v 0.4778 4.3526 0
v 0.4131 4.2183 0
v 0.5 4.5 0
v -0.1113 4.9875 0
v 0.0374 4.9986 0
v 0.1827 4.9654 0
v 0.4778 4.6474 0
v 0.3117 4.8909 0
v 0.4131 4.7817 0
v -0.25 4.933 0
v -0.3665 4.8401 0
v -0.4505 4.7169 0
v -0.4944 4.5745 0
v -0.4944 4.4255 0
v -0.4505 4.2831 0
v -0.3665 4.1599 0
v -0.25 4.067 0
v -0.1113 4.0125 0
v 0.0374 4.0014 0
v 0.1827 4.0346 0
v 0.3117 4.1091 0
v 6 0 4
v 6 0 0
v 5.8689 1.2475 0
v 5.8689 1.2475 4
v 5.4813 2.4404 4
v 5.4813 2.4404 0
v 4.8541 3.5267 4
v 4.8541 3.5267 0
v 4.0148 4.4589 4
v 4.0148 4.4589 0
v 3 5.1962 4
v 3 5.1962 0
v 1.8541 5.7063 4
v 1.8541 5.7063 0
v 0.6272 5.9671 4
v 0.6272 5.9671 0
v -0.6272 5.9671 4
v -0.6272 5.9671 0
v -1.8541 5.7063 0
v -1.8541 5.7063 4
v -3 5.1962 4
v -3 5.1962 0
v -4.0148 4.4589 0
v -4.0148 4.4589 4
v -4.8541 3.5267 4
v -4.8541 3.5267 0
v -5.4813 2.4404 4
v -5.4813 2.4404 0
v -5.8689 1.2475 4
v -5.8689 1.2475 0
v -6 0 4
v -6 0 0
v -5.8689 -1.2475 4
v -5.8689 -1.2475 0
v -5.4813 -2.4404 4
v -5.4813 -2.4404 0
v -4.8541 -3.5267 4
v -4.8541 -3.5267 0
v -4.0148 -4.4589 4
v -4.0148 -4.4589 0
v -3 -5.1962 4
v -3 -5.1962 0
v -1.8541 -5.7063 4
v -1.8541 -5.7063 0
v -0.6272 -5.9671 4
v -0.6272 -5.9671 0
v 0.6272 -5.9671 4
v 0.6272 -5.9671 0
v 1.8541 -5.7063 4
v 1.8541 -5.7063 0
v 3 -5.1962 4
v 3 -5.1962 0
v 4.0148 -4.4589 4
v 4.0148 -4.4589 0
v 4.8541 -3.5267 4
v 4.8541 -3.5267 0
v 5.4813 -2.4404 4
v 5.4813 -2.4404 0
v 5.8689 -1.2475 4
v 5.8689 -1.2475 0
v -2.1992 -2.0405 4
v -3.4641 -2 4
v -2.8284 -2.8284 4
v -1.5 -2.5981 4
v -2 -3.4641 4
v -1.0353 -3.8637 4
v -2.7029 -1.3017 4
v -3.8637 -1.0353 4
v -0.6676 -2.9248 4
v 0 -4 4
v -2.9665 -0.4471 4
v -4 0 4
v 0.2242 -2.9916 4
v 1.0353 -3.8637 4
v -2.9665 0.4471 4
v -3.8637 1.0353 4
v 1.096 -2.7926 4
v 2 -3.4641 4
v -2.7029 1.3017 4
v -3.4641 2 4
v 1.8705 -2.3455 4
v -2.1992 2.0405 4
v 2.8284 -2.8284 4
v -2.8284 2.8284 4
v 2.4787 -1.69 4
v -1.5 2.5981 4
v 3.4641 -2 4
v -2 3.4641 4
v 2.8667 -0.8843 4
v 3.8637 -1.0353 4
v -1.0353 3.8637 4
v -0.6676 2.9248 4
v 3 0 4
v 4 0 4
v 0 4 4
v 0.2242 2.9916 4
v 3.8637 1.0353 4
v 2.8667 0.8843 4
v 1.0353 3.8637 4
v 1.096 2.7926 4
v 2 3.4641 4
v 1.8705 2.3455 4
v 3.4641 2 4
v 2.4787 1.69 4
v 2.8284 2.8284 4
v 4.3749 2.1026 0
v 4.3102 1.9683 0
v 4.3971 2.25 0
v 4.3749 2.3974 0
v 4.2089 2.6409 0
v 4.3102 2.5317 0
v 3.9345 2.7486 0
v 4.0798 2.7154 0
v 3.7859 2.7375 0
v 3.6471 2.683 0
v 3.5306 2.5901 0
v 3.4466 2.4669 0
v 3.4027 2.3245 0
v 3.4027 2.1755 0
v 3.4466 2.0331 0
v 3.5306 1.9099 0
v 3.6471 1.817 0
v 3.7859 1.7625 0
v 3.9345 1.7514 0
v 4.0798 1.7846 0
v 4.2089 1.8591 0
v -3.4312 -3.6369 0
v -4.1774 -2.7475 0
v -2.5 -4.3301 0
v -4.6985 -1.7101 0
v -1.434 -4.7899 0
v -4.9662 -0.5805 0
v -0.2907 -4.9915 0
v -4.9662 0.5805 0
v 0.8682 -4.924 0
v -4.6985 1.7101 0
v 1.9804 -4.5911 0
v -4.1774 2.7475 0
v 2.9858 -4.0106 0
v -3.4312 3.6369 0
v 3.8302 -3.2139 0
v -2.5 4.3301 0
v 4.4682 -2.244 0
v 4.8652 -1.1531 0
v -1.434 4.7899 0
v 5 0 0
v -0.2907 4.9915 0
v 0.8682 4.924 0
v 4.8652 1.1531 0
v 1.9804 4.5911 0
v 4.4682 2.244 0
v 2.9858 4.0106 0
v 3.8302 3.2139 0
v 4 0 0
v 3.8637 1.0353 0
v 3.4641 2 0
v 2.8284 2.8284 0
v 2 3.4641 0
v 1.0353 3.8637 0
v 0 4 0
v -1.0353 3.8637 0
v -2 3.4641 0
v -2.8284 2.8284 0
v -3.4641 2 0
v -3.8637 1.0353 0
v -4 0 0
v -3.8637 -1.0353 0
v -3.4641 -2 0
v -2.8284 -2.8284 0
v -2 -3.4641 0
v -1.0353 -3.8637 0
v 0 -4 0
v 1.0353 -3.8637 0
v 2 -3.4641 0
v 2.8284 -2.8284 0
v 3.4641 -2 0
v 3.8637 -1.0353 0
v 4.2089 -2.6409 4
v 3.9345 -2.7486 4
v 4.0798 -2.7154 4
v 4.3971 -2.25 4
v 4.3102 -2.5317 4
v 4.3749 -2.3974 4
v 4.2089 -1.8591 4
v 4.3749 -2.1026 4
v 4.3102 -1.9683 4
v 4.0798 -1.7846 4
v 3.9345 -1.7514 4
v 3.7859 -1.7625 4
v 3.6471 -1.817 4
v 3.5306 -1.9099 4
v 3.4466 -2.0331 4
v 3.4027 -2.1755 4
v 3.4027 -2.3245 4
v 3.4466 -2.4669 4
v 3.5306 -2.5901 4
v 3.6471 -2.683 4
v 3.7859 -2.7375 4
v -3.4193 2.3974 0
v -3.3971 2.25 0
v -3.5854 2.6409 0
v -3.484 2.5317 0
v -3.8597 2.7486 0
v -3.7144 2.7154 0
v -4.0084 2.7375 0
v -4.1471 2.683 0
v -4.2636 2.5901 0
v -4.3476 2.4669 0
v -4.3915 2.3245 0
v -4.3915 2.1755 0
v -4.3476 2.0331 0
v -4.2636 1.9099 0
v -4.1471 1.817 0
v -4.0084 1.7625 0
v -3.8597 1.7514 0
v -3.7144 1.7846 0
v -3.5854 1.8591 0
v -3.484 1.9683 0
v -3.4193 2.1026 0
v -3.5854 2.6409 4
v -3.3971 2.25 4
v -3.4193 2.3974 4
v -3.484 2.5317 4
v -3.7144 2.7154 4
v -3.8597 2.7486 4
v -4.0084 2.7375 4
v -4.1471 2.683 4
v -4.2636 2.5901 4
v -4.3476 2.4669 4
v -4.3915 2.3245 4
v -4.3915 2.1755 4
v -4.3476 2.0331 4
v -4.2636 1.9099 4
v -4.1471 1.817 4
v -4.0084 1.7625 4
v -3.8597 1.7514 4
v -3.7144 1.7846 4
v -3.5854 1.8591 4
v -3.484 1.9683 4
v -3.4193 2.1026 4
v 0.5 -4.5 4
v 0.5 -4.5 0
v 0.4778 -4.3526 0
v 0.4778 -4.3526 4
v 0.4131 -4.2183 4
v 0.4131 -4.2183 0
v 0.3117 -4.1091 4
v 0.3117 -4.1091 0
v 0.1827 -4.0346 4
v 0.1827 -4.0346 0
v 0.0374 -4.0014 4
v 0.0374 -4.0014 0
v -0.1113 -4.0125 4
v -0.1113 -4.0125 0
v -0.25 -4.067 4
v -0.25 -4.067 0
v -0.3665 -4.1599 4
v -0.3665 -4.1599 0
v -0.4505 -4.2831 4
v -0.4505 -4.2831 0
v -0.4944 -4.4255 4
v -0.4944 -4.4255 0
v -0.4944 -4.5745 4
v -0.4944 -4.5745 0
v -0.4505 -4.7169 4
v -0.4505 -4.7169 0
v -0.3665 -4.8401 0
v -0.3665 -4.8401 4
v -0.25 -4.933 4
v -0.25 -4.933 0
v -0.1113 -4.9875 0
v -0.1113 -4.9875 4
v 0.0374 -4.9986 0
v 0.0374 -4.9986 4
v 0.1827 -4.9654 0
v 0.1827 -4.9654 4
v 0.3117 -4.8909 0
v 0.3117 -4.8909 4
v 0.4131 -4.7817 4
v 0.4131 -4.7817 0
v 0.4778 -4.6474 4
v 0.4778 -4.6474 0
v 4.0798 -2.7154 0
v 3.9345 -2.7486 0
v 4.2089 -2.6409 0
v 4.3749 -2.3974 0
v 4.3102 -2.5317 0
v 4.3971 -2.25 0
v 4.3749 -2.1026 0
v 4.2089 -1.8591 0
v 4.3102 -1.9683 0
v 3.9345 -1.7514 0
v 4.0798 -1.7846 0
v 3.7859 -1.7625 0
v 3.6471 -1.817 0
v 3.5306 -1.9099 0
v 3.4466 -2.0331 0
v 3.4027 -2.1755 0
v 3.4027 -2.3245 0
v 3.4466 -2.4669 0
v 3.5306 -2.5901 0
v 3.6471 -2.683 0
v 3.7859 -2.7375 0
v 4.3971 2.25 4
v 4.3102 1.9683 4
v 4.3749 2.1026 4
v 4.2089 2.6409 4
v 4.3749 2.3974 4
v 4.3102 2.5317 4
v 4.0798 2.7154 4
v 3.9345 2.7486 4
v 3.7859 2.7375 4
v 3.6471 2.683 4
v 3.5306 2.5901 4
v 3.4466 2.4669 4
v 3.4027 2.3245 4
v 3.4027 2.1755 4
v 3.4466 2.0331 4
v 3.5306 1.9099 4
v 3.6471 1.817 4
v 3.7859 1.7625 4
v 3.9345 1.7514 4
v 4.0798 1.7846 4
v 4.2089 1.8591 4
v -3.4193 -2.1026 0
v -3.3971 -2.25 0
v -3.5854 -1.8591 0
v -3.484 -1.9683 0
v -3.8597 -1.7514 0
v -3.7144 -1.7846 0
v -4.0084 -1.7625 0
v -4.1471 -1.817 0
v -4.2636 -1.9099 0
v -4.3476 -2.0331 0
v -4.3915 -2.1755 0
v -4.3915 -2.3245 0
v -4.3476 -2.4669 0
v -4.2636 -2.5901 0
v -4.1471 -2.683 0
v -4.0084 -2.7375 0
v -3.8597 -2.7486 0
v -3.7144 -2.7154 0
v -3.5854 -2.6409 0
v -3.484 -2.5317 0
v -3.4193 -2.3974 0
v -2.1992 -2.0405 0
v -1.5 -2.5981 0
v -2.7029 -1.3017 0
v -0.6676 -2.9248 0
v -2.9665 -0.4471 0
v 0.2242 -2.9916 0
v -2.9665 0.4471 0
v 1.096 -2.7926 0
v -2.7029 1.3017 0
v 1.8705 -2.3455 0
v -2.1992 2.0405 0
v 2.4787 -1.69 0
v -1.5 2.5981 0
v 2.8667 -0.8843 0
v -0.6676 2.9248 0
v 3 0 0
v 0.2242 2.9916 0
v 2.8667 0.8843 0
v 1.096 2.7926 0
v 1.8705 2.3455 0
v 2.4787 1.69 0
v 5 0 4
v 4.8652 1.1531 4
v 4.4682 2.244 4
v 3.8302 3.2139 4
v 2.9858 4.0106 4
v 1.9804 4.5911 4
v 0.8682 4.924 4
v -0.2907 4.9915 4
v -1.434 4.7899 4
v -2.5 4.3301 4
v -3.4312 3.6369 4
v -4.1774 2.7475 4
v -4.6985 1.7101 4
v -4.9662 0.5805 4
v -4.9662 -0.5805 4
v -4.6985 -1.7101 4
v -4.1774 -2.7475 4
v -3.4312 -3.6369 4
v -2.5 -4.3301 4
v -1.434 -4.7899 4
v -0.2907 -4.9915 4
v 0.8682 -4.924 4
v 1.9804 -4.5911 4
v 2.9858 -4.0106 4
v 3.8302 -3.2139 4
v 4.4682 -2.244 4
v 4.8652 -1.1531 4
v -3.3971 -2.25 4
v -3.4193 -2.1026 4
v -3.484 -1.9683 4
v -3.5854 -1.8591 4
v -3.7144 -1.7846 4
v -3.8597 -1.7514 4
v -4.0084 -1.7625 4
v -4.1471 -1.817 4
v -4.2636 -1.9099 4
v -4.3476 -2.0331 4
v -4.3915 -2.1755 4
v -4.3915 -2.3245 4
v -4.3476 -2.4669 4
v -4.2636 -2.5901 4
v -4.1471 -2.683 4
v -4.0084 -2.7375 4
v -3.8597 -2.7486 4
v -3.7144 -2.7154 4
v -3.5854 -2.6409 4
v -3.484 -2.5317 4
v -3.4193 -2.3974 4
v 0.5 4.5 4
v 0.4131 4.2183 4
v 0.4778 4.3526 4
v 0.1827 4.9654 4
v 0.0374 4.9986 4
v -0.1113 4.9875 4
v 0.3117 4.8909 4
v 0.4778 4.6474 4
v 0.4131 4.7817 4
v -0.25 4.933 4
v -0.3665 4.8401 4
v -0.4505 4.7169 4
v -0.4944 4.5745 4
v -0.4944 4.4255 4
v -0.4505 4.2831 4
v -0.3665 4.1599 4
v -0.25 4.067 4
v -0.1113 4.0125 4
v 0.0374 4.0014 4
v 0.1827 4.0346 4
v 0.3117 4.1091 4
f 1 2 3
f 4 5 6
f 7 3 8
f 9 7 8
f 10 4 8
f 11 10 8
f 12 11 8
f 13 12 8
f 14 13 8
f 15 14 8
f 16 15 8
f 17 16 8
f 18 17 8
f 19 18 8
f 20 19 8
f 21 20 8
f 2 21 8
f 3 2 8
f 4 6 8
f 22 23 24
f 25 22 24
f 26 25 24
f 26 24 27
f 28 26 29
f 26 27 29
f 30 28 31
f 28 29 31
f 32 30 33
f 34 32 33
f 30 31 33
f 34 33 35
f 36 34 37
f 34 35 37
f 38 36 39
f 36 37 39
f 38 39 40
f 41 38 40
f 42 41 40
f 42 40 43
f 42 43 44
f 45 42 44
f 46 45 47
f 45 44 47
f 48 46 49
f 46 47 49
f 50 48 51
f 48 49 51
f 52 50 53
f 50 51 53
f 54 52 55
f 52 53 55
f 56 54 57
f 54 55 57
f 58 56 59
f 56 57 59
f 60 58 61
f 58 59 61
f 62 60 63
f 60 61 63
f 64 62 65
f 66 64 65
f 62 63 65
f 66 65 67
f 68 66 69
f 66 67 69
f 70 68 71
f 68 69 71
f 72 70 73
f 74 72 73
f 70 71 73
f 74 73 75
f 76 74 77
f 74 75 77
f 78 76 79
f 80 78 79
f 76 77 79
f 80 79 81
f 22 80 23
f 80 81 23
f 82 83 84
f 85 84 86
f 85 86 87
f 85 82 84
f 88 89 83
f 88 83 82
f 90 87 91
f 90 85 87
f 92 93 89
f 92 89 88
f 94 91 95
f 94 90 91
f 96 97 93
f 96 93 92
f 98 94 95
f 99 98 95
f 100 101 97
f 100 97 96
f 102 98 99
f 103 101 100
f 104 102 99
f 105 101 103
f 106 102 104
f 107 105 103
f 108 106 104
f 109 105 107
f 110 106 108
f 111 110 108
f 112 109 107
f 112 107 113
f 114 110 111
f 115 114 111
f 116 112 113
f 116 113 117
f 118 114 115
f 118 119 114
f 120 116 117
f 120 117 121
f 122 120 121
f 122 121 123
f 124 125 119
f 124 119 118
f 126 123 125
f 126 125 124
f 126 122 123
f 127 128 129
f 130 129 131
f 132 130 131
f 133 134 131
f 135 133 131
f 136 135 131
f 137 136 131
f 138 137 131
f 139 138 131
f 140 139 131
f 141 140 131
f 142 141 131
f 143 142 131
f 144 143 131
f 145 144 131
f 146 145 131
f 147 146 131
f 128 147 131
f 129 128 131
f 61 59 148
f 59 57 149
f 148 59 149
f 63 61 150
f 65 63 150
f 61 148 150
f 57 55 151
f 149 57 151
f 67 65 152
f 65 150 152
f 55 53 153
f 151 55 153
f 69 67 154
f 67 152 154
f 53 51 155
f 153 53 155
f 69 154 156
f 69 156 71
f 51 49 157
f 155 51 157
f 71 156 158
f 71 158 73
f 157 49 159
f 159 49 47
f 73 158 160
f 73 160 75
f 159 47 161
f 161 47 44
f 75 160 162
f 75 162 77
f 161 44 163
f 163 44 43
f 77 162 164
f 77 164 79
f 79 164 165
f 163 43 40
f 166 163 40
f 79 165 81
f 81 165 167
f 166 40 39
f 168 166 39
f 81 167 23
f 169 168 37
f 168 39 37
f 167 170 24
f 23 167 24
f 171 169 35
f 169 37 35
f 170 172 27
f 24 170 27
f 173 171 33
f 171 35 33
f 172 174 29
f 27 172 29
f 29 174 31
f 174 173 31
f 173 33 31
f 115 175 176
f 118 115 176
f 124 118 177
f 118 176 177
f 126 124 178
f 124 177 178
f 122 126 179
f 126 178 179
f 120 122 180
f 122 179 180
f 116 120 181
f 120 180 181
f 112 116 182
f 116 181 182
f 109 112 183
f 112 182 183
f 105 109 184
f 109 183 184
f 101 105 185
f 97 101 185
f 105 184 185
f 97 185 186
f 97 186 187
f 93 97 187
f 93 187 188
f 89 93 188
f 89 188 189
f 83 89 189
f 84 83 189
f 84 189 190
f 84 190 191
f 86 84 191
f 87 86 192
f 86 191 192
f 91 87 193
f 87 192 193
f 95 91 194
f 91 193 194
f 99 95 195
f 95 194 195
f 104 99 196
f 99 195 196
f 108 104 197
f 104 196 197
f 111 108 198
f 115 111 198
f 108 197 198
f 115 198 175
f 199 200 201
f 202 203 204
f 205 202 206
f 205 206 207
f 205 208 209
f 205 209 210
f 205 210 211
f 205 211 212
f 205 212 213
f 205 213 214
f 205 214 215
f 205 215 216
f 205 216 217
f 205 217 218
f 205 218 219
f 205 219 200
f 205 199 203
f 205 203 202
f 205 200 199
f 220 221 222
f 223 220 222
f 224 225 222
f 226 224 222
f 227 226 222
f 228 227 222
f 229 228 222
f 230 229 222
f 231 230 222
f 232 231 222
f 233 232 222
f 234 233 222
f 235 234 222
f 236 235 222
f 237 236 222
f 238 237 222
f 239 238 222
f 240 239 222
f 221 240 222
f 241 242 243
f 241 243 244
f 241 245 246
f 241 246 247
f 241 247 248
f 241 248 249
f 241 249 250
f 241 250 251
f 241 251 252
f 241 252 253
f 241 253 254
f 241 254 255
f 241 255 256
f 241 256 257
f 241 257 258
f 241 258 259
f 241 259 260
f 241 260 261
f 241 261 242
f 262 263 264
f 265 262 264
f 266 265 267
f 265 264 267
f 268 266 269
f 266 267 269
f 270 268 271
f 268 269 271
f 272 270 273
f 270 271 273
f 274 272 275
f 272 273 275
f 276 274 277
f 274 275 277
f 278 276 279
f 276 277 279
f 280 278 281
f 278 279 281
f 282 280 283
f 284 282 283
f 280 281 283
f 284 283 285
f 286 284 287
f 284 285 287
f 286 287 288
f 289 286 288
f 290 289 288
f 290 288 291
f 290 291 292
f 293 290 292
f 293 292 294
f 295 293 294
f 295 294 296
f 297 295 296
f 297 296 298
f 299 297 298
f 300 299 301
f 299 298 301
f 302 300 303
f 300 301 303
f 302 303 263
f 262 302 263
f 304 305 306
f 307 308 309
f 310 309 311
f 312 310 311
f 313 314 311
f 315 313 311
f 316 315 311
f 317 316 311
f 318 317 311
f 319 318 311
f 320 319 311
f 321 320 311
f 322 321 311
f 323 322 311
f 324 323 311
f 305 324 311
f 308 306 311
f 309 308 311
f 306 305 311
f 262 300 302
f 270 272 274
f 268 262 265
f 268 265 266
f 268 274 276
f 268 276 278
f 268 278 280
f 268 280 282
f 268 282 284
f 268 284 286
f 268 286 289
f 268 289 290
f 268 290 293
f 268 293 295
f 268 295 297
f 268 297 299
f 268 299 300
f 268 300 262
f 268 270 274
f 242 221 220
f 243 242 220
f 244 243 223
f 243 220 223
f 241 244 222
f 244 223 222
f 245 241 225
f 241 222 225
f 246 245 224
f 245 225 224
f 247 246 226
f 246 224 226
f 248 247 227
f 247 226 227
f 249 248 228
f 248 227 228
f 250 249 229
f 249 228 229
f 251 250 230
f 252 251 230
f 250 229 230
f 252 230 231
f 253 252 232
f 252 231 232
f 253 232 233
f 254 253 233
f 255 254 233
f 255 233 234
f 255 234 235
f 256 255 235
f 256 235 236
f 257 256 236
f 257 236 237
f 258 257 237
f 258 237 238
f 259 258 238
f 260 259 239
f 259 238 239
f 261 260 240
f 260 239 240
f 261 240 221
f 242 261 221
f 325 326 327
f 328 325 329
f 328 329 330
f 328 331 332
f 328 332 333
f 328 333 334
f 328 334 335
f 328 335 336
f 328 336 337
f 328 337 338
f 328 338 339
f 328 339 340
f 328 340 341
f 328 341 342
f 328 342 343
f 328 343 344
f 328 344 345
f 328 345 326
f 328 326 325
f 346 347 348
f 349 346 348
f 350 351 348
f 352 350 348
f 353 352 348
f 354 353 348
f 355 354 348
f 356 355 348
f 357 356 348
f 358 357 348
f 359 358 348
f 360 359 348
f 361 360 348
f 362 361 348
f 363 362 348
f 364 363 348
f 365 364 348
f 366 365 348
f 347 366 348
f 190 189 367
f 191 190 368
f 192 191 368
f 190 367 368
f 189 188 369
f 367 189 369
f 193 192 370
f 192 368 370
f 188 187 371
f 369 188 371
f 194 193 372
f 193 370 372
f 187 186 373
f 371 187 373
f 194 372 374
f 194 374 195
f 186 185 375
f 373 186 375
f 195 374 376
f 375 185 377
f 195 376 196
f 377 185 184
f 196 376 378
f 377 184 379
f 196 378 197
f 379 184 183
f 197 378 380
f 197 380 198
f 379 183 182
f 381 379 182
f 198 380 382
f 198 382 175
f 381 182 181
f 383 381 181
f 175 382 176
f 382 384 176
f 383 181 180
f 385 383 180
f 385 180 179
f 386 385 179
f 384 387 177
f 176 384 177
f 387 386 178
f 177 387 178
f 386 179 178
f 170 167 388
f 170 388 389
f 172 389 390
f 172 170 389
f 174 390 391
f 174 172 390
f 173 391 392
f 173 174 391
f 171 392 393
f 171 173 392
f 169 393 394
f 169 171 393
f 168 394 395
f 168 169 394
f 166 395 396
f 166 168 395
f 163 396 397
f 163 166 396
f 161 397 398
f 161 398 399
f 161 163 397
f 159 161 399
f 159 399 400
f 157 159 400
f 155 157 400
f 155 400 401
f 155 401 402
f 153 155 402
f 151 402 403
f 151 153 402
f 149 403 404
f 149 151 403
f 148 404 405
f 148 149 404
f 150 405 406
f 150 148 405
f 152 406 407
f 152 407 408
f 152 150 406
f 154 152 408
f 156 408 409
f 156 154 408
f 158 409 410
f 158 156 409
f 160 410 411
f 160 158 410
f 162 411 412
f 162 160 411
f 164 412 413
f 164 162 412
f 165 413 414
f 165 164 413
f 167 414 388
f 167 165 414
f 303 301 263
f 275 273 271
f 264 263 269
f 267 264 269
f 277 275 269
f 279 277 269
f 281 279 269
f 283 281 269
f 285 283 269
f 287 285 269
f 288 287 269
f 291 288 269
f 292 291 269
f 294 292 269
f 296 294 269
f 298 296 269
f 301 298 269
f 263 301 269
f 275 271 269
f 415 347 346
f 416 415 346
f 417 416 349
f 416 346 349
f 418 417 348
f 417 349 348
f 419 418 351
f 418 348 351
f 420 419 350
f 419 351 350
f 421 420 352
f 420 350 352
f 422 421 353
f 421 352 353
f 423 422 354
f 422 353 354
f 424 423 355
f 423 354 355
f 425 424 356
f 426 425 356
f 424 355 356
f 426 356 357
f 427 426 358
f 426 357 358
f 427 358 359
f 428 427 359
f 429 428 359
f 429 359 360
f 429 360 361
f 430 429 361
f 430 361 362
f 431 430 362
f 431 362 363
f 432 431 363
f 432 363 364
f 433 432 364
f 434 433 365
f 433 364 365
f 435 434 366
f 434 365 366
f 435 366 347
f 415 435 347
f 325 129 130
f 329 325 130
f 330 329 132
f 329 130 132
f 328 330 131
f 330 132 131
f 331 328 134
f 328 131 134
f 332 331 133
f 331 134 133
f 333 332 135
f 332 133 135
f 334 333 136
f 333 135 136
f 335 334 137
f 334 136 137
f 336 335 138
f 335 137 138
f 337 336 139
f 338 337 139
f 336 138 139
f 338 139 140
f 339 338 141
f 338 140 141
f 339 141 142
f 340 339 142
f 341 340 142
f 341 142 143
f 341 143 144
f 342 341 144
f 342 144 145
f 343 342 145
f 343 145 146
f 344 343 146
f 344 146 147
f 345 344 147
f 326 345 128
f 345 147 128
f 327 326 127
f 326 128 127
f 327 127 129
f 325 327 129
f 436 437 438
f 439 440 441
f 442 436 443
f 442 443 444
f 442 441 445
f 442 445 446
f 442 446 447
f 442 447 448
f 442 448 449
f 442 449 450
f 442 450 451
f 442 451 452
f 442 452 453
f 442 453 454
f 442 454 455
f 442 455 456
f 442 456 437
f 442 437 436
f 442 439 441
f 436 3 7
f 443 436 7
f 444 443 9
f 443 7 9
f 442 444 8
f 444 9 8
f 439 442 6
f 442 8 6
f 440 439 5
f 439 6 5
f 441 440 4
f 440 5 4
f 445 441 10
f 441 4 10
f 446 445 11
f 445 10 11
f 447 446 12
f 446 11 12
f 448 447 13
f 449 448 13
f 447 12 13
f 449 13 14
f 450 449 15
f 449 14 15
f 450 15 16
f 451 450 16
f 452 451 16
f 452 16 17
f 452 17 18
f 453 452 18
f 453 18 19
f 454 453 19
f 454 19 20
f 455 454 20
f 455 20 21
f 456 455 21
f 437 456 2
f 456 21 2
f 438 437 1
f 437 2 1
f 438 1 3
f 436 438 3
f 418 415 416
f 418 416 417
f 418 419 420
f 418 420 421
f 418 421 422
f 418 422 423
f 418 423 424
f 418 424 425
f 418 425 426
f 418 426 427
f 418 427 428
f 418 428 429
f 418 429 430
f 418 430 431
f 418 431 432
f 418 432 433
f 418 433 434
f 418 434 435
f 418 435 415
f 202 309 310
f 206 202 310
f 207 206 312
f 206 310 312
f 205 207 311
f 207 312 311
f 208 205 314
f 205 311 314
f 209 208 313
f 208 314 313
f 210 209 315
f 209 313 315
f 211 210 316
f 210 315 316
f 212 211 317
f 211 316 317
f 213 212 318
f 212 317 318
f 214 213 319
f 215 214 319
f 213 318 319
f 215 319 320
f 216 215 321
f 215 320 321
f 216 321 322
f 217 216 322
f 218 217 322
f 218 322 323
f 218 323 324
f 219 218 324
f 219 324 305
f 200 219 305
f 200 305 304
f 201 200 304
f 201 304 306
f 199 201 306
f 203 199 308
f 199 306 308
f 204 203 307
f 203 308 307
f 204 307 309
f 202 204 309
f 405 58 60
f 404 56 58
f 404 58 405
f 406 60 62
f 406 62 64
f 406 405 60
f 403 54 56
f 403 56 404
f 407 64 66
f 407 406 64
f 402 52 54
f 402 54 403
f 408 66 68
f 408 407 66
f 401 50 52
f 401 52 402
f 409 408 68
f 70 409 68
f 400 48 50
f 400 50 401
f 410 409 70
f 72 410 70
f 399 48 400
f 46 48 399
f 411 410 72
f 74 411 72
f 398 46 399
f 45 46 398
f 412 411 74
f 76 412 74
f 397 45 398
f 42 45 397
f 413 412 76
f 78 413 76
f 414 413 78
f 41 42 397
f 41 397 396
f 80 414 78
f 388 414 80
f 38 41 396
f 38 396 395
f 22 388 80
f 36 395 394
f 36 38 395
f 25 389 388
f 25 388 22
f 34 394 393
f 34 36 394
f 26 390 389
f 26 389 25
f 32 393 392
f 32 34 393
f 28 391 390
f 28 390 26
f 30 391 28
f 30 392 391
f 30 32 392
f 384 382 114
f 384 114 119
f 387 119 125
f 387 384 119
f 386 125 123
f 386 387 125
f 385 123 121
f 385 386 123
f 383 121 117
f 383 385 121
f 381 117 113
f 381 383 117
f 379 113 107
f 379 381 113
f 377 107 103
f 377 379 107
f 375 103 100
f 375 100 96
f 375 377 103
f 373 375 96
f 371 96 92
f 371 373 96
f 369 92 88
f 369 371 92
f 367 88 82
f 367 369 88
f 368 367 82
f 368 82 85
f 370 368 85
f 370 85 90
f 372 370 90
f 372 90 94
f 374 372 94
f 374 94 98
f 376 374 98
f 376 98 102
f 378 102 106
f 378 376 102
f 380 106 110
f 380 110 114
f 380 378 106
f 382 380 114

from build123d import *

# Parameters (mm, degrees)
SKETCH_1_R        = 4
SKETCH_1_R_2      = 3
EXTRUDE_1_DEPTH   = 4
SKETCH_1_R_3      = 0.5
EXTRUDE_1_2_DEPTH = 4
SKETCH_1_R_4      = 6
SKETCH_1_R_5      = 5
EXTRUDE_1_3_DEPTH = 4
EXTRUDE_1_4_DEPTH = 4
EXTRUDE_1_5_DEPTH = 4
EXTRUDE_1_6_DEPTH = 4
EXTRUDE_1_7_DEPTH = 4
EXTRUDE_1_8_DEPTH = 4


with BuildPart() as part:
    # 草图1 → 凸台-拉伸1 (new body)
    with BuildSketch(Plane.XY):
        Circle(SKETCH_1_R)
        Circle(SKETCH_1_R_2, mode=Mode.SUBTRACT)
    extrude(amount=EXTRUDE_1_DEPTH)


with BuildPart() as body_2:
    # 草图1 → Extrude 1 2 (new body)
    with BuildSketch(Plane.XY):
        with Locations((0, 4.5)):
            Circle(SKETCH_1_R_3)
    extrude(amount=EXTRUDE_1_2_DEPTH)


with BuildPart() as body_3:
    # 草图1 → Extrude 1 3 (new body)
    with BuildSketch(Plane.XY):
        Circle(SKETCH_1_R_4)
        Circle(SKETCH_1_R_5, mode=Mode.SUBTRACT)
    extrude(amount=EXTRUDE_1_3_DEPTH)


with BuildPart() as body_4:
    # 草图1 → Extrude 1 4 (new body)
    with BuildSketch(Plane.XY):
        with Locations((-3.897114317, 2.25)):
            Circle(SKETCH_1_R_3)
    extrude(amount=EXTRUDE_1_4_DEPTH)


with BuildPart() as body_5:
    # 草图1 → Extrude 1 5 (new body)
    with BuildSketch(Plane.XY):
        with Locations((3.897114317, 2.25)):
            Circle(SKETCH_1_R_3)
    extrude(amount=EXTRUDE_1_5_DEPTH)


with BuildPart() as body_6:
    # 草图1 → Extrude 1 6 (new body)
    with BuildSketch(Plane.XY):
        with Locations((3.897114317, -2.25)):
            Circle(SKETCH_1_R_3)
    extrude(amount=EXTRUDE_1_6_DEPTH)


with BuildPart() as body_7:
    # 草图1 → Extrude 1 7 (new body)
    with BuildSketch(Plane.XY):
        with Locations((0, -4.5)):
            Circle(SKETCH_1_R_3)
    extrude(amount=EXTRUDE_1_7_DEPTH)


with BuildPart() as body_8:
    # 草图1 → Extrude 1 8 (new body)
    with BuildSketch(Plane.XY):
        with Locations((-3.897114317, -2.25)):
            Circle(SKETCH_1_R_3)
    extrude(amount=EXTRUDE_1_8_DEPTH)


solid = Compound([part.part, body_2.part, body_3.part, body_4.part, body_5.part, body_6.part, body_7.part, body_8.part])
